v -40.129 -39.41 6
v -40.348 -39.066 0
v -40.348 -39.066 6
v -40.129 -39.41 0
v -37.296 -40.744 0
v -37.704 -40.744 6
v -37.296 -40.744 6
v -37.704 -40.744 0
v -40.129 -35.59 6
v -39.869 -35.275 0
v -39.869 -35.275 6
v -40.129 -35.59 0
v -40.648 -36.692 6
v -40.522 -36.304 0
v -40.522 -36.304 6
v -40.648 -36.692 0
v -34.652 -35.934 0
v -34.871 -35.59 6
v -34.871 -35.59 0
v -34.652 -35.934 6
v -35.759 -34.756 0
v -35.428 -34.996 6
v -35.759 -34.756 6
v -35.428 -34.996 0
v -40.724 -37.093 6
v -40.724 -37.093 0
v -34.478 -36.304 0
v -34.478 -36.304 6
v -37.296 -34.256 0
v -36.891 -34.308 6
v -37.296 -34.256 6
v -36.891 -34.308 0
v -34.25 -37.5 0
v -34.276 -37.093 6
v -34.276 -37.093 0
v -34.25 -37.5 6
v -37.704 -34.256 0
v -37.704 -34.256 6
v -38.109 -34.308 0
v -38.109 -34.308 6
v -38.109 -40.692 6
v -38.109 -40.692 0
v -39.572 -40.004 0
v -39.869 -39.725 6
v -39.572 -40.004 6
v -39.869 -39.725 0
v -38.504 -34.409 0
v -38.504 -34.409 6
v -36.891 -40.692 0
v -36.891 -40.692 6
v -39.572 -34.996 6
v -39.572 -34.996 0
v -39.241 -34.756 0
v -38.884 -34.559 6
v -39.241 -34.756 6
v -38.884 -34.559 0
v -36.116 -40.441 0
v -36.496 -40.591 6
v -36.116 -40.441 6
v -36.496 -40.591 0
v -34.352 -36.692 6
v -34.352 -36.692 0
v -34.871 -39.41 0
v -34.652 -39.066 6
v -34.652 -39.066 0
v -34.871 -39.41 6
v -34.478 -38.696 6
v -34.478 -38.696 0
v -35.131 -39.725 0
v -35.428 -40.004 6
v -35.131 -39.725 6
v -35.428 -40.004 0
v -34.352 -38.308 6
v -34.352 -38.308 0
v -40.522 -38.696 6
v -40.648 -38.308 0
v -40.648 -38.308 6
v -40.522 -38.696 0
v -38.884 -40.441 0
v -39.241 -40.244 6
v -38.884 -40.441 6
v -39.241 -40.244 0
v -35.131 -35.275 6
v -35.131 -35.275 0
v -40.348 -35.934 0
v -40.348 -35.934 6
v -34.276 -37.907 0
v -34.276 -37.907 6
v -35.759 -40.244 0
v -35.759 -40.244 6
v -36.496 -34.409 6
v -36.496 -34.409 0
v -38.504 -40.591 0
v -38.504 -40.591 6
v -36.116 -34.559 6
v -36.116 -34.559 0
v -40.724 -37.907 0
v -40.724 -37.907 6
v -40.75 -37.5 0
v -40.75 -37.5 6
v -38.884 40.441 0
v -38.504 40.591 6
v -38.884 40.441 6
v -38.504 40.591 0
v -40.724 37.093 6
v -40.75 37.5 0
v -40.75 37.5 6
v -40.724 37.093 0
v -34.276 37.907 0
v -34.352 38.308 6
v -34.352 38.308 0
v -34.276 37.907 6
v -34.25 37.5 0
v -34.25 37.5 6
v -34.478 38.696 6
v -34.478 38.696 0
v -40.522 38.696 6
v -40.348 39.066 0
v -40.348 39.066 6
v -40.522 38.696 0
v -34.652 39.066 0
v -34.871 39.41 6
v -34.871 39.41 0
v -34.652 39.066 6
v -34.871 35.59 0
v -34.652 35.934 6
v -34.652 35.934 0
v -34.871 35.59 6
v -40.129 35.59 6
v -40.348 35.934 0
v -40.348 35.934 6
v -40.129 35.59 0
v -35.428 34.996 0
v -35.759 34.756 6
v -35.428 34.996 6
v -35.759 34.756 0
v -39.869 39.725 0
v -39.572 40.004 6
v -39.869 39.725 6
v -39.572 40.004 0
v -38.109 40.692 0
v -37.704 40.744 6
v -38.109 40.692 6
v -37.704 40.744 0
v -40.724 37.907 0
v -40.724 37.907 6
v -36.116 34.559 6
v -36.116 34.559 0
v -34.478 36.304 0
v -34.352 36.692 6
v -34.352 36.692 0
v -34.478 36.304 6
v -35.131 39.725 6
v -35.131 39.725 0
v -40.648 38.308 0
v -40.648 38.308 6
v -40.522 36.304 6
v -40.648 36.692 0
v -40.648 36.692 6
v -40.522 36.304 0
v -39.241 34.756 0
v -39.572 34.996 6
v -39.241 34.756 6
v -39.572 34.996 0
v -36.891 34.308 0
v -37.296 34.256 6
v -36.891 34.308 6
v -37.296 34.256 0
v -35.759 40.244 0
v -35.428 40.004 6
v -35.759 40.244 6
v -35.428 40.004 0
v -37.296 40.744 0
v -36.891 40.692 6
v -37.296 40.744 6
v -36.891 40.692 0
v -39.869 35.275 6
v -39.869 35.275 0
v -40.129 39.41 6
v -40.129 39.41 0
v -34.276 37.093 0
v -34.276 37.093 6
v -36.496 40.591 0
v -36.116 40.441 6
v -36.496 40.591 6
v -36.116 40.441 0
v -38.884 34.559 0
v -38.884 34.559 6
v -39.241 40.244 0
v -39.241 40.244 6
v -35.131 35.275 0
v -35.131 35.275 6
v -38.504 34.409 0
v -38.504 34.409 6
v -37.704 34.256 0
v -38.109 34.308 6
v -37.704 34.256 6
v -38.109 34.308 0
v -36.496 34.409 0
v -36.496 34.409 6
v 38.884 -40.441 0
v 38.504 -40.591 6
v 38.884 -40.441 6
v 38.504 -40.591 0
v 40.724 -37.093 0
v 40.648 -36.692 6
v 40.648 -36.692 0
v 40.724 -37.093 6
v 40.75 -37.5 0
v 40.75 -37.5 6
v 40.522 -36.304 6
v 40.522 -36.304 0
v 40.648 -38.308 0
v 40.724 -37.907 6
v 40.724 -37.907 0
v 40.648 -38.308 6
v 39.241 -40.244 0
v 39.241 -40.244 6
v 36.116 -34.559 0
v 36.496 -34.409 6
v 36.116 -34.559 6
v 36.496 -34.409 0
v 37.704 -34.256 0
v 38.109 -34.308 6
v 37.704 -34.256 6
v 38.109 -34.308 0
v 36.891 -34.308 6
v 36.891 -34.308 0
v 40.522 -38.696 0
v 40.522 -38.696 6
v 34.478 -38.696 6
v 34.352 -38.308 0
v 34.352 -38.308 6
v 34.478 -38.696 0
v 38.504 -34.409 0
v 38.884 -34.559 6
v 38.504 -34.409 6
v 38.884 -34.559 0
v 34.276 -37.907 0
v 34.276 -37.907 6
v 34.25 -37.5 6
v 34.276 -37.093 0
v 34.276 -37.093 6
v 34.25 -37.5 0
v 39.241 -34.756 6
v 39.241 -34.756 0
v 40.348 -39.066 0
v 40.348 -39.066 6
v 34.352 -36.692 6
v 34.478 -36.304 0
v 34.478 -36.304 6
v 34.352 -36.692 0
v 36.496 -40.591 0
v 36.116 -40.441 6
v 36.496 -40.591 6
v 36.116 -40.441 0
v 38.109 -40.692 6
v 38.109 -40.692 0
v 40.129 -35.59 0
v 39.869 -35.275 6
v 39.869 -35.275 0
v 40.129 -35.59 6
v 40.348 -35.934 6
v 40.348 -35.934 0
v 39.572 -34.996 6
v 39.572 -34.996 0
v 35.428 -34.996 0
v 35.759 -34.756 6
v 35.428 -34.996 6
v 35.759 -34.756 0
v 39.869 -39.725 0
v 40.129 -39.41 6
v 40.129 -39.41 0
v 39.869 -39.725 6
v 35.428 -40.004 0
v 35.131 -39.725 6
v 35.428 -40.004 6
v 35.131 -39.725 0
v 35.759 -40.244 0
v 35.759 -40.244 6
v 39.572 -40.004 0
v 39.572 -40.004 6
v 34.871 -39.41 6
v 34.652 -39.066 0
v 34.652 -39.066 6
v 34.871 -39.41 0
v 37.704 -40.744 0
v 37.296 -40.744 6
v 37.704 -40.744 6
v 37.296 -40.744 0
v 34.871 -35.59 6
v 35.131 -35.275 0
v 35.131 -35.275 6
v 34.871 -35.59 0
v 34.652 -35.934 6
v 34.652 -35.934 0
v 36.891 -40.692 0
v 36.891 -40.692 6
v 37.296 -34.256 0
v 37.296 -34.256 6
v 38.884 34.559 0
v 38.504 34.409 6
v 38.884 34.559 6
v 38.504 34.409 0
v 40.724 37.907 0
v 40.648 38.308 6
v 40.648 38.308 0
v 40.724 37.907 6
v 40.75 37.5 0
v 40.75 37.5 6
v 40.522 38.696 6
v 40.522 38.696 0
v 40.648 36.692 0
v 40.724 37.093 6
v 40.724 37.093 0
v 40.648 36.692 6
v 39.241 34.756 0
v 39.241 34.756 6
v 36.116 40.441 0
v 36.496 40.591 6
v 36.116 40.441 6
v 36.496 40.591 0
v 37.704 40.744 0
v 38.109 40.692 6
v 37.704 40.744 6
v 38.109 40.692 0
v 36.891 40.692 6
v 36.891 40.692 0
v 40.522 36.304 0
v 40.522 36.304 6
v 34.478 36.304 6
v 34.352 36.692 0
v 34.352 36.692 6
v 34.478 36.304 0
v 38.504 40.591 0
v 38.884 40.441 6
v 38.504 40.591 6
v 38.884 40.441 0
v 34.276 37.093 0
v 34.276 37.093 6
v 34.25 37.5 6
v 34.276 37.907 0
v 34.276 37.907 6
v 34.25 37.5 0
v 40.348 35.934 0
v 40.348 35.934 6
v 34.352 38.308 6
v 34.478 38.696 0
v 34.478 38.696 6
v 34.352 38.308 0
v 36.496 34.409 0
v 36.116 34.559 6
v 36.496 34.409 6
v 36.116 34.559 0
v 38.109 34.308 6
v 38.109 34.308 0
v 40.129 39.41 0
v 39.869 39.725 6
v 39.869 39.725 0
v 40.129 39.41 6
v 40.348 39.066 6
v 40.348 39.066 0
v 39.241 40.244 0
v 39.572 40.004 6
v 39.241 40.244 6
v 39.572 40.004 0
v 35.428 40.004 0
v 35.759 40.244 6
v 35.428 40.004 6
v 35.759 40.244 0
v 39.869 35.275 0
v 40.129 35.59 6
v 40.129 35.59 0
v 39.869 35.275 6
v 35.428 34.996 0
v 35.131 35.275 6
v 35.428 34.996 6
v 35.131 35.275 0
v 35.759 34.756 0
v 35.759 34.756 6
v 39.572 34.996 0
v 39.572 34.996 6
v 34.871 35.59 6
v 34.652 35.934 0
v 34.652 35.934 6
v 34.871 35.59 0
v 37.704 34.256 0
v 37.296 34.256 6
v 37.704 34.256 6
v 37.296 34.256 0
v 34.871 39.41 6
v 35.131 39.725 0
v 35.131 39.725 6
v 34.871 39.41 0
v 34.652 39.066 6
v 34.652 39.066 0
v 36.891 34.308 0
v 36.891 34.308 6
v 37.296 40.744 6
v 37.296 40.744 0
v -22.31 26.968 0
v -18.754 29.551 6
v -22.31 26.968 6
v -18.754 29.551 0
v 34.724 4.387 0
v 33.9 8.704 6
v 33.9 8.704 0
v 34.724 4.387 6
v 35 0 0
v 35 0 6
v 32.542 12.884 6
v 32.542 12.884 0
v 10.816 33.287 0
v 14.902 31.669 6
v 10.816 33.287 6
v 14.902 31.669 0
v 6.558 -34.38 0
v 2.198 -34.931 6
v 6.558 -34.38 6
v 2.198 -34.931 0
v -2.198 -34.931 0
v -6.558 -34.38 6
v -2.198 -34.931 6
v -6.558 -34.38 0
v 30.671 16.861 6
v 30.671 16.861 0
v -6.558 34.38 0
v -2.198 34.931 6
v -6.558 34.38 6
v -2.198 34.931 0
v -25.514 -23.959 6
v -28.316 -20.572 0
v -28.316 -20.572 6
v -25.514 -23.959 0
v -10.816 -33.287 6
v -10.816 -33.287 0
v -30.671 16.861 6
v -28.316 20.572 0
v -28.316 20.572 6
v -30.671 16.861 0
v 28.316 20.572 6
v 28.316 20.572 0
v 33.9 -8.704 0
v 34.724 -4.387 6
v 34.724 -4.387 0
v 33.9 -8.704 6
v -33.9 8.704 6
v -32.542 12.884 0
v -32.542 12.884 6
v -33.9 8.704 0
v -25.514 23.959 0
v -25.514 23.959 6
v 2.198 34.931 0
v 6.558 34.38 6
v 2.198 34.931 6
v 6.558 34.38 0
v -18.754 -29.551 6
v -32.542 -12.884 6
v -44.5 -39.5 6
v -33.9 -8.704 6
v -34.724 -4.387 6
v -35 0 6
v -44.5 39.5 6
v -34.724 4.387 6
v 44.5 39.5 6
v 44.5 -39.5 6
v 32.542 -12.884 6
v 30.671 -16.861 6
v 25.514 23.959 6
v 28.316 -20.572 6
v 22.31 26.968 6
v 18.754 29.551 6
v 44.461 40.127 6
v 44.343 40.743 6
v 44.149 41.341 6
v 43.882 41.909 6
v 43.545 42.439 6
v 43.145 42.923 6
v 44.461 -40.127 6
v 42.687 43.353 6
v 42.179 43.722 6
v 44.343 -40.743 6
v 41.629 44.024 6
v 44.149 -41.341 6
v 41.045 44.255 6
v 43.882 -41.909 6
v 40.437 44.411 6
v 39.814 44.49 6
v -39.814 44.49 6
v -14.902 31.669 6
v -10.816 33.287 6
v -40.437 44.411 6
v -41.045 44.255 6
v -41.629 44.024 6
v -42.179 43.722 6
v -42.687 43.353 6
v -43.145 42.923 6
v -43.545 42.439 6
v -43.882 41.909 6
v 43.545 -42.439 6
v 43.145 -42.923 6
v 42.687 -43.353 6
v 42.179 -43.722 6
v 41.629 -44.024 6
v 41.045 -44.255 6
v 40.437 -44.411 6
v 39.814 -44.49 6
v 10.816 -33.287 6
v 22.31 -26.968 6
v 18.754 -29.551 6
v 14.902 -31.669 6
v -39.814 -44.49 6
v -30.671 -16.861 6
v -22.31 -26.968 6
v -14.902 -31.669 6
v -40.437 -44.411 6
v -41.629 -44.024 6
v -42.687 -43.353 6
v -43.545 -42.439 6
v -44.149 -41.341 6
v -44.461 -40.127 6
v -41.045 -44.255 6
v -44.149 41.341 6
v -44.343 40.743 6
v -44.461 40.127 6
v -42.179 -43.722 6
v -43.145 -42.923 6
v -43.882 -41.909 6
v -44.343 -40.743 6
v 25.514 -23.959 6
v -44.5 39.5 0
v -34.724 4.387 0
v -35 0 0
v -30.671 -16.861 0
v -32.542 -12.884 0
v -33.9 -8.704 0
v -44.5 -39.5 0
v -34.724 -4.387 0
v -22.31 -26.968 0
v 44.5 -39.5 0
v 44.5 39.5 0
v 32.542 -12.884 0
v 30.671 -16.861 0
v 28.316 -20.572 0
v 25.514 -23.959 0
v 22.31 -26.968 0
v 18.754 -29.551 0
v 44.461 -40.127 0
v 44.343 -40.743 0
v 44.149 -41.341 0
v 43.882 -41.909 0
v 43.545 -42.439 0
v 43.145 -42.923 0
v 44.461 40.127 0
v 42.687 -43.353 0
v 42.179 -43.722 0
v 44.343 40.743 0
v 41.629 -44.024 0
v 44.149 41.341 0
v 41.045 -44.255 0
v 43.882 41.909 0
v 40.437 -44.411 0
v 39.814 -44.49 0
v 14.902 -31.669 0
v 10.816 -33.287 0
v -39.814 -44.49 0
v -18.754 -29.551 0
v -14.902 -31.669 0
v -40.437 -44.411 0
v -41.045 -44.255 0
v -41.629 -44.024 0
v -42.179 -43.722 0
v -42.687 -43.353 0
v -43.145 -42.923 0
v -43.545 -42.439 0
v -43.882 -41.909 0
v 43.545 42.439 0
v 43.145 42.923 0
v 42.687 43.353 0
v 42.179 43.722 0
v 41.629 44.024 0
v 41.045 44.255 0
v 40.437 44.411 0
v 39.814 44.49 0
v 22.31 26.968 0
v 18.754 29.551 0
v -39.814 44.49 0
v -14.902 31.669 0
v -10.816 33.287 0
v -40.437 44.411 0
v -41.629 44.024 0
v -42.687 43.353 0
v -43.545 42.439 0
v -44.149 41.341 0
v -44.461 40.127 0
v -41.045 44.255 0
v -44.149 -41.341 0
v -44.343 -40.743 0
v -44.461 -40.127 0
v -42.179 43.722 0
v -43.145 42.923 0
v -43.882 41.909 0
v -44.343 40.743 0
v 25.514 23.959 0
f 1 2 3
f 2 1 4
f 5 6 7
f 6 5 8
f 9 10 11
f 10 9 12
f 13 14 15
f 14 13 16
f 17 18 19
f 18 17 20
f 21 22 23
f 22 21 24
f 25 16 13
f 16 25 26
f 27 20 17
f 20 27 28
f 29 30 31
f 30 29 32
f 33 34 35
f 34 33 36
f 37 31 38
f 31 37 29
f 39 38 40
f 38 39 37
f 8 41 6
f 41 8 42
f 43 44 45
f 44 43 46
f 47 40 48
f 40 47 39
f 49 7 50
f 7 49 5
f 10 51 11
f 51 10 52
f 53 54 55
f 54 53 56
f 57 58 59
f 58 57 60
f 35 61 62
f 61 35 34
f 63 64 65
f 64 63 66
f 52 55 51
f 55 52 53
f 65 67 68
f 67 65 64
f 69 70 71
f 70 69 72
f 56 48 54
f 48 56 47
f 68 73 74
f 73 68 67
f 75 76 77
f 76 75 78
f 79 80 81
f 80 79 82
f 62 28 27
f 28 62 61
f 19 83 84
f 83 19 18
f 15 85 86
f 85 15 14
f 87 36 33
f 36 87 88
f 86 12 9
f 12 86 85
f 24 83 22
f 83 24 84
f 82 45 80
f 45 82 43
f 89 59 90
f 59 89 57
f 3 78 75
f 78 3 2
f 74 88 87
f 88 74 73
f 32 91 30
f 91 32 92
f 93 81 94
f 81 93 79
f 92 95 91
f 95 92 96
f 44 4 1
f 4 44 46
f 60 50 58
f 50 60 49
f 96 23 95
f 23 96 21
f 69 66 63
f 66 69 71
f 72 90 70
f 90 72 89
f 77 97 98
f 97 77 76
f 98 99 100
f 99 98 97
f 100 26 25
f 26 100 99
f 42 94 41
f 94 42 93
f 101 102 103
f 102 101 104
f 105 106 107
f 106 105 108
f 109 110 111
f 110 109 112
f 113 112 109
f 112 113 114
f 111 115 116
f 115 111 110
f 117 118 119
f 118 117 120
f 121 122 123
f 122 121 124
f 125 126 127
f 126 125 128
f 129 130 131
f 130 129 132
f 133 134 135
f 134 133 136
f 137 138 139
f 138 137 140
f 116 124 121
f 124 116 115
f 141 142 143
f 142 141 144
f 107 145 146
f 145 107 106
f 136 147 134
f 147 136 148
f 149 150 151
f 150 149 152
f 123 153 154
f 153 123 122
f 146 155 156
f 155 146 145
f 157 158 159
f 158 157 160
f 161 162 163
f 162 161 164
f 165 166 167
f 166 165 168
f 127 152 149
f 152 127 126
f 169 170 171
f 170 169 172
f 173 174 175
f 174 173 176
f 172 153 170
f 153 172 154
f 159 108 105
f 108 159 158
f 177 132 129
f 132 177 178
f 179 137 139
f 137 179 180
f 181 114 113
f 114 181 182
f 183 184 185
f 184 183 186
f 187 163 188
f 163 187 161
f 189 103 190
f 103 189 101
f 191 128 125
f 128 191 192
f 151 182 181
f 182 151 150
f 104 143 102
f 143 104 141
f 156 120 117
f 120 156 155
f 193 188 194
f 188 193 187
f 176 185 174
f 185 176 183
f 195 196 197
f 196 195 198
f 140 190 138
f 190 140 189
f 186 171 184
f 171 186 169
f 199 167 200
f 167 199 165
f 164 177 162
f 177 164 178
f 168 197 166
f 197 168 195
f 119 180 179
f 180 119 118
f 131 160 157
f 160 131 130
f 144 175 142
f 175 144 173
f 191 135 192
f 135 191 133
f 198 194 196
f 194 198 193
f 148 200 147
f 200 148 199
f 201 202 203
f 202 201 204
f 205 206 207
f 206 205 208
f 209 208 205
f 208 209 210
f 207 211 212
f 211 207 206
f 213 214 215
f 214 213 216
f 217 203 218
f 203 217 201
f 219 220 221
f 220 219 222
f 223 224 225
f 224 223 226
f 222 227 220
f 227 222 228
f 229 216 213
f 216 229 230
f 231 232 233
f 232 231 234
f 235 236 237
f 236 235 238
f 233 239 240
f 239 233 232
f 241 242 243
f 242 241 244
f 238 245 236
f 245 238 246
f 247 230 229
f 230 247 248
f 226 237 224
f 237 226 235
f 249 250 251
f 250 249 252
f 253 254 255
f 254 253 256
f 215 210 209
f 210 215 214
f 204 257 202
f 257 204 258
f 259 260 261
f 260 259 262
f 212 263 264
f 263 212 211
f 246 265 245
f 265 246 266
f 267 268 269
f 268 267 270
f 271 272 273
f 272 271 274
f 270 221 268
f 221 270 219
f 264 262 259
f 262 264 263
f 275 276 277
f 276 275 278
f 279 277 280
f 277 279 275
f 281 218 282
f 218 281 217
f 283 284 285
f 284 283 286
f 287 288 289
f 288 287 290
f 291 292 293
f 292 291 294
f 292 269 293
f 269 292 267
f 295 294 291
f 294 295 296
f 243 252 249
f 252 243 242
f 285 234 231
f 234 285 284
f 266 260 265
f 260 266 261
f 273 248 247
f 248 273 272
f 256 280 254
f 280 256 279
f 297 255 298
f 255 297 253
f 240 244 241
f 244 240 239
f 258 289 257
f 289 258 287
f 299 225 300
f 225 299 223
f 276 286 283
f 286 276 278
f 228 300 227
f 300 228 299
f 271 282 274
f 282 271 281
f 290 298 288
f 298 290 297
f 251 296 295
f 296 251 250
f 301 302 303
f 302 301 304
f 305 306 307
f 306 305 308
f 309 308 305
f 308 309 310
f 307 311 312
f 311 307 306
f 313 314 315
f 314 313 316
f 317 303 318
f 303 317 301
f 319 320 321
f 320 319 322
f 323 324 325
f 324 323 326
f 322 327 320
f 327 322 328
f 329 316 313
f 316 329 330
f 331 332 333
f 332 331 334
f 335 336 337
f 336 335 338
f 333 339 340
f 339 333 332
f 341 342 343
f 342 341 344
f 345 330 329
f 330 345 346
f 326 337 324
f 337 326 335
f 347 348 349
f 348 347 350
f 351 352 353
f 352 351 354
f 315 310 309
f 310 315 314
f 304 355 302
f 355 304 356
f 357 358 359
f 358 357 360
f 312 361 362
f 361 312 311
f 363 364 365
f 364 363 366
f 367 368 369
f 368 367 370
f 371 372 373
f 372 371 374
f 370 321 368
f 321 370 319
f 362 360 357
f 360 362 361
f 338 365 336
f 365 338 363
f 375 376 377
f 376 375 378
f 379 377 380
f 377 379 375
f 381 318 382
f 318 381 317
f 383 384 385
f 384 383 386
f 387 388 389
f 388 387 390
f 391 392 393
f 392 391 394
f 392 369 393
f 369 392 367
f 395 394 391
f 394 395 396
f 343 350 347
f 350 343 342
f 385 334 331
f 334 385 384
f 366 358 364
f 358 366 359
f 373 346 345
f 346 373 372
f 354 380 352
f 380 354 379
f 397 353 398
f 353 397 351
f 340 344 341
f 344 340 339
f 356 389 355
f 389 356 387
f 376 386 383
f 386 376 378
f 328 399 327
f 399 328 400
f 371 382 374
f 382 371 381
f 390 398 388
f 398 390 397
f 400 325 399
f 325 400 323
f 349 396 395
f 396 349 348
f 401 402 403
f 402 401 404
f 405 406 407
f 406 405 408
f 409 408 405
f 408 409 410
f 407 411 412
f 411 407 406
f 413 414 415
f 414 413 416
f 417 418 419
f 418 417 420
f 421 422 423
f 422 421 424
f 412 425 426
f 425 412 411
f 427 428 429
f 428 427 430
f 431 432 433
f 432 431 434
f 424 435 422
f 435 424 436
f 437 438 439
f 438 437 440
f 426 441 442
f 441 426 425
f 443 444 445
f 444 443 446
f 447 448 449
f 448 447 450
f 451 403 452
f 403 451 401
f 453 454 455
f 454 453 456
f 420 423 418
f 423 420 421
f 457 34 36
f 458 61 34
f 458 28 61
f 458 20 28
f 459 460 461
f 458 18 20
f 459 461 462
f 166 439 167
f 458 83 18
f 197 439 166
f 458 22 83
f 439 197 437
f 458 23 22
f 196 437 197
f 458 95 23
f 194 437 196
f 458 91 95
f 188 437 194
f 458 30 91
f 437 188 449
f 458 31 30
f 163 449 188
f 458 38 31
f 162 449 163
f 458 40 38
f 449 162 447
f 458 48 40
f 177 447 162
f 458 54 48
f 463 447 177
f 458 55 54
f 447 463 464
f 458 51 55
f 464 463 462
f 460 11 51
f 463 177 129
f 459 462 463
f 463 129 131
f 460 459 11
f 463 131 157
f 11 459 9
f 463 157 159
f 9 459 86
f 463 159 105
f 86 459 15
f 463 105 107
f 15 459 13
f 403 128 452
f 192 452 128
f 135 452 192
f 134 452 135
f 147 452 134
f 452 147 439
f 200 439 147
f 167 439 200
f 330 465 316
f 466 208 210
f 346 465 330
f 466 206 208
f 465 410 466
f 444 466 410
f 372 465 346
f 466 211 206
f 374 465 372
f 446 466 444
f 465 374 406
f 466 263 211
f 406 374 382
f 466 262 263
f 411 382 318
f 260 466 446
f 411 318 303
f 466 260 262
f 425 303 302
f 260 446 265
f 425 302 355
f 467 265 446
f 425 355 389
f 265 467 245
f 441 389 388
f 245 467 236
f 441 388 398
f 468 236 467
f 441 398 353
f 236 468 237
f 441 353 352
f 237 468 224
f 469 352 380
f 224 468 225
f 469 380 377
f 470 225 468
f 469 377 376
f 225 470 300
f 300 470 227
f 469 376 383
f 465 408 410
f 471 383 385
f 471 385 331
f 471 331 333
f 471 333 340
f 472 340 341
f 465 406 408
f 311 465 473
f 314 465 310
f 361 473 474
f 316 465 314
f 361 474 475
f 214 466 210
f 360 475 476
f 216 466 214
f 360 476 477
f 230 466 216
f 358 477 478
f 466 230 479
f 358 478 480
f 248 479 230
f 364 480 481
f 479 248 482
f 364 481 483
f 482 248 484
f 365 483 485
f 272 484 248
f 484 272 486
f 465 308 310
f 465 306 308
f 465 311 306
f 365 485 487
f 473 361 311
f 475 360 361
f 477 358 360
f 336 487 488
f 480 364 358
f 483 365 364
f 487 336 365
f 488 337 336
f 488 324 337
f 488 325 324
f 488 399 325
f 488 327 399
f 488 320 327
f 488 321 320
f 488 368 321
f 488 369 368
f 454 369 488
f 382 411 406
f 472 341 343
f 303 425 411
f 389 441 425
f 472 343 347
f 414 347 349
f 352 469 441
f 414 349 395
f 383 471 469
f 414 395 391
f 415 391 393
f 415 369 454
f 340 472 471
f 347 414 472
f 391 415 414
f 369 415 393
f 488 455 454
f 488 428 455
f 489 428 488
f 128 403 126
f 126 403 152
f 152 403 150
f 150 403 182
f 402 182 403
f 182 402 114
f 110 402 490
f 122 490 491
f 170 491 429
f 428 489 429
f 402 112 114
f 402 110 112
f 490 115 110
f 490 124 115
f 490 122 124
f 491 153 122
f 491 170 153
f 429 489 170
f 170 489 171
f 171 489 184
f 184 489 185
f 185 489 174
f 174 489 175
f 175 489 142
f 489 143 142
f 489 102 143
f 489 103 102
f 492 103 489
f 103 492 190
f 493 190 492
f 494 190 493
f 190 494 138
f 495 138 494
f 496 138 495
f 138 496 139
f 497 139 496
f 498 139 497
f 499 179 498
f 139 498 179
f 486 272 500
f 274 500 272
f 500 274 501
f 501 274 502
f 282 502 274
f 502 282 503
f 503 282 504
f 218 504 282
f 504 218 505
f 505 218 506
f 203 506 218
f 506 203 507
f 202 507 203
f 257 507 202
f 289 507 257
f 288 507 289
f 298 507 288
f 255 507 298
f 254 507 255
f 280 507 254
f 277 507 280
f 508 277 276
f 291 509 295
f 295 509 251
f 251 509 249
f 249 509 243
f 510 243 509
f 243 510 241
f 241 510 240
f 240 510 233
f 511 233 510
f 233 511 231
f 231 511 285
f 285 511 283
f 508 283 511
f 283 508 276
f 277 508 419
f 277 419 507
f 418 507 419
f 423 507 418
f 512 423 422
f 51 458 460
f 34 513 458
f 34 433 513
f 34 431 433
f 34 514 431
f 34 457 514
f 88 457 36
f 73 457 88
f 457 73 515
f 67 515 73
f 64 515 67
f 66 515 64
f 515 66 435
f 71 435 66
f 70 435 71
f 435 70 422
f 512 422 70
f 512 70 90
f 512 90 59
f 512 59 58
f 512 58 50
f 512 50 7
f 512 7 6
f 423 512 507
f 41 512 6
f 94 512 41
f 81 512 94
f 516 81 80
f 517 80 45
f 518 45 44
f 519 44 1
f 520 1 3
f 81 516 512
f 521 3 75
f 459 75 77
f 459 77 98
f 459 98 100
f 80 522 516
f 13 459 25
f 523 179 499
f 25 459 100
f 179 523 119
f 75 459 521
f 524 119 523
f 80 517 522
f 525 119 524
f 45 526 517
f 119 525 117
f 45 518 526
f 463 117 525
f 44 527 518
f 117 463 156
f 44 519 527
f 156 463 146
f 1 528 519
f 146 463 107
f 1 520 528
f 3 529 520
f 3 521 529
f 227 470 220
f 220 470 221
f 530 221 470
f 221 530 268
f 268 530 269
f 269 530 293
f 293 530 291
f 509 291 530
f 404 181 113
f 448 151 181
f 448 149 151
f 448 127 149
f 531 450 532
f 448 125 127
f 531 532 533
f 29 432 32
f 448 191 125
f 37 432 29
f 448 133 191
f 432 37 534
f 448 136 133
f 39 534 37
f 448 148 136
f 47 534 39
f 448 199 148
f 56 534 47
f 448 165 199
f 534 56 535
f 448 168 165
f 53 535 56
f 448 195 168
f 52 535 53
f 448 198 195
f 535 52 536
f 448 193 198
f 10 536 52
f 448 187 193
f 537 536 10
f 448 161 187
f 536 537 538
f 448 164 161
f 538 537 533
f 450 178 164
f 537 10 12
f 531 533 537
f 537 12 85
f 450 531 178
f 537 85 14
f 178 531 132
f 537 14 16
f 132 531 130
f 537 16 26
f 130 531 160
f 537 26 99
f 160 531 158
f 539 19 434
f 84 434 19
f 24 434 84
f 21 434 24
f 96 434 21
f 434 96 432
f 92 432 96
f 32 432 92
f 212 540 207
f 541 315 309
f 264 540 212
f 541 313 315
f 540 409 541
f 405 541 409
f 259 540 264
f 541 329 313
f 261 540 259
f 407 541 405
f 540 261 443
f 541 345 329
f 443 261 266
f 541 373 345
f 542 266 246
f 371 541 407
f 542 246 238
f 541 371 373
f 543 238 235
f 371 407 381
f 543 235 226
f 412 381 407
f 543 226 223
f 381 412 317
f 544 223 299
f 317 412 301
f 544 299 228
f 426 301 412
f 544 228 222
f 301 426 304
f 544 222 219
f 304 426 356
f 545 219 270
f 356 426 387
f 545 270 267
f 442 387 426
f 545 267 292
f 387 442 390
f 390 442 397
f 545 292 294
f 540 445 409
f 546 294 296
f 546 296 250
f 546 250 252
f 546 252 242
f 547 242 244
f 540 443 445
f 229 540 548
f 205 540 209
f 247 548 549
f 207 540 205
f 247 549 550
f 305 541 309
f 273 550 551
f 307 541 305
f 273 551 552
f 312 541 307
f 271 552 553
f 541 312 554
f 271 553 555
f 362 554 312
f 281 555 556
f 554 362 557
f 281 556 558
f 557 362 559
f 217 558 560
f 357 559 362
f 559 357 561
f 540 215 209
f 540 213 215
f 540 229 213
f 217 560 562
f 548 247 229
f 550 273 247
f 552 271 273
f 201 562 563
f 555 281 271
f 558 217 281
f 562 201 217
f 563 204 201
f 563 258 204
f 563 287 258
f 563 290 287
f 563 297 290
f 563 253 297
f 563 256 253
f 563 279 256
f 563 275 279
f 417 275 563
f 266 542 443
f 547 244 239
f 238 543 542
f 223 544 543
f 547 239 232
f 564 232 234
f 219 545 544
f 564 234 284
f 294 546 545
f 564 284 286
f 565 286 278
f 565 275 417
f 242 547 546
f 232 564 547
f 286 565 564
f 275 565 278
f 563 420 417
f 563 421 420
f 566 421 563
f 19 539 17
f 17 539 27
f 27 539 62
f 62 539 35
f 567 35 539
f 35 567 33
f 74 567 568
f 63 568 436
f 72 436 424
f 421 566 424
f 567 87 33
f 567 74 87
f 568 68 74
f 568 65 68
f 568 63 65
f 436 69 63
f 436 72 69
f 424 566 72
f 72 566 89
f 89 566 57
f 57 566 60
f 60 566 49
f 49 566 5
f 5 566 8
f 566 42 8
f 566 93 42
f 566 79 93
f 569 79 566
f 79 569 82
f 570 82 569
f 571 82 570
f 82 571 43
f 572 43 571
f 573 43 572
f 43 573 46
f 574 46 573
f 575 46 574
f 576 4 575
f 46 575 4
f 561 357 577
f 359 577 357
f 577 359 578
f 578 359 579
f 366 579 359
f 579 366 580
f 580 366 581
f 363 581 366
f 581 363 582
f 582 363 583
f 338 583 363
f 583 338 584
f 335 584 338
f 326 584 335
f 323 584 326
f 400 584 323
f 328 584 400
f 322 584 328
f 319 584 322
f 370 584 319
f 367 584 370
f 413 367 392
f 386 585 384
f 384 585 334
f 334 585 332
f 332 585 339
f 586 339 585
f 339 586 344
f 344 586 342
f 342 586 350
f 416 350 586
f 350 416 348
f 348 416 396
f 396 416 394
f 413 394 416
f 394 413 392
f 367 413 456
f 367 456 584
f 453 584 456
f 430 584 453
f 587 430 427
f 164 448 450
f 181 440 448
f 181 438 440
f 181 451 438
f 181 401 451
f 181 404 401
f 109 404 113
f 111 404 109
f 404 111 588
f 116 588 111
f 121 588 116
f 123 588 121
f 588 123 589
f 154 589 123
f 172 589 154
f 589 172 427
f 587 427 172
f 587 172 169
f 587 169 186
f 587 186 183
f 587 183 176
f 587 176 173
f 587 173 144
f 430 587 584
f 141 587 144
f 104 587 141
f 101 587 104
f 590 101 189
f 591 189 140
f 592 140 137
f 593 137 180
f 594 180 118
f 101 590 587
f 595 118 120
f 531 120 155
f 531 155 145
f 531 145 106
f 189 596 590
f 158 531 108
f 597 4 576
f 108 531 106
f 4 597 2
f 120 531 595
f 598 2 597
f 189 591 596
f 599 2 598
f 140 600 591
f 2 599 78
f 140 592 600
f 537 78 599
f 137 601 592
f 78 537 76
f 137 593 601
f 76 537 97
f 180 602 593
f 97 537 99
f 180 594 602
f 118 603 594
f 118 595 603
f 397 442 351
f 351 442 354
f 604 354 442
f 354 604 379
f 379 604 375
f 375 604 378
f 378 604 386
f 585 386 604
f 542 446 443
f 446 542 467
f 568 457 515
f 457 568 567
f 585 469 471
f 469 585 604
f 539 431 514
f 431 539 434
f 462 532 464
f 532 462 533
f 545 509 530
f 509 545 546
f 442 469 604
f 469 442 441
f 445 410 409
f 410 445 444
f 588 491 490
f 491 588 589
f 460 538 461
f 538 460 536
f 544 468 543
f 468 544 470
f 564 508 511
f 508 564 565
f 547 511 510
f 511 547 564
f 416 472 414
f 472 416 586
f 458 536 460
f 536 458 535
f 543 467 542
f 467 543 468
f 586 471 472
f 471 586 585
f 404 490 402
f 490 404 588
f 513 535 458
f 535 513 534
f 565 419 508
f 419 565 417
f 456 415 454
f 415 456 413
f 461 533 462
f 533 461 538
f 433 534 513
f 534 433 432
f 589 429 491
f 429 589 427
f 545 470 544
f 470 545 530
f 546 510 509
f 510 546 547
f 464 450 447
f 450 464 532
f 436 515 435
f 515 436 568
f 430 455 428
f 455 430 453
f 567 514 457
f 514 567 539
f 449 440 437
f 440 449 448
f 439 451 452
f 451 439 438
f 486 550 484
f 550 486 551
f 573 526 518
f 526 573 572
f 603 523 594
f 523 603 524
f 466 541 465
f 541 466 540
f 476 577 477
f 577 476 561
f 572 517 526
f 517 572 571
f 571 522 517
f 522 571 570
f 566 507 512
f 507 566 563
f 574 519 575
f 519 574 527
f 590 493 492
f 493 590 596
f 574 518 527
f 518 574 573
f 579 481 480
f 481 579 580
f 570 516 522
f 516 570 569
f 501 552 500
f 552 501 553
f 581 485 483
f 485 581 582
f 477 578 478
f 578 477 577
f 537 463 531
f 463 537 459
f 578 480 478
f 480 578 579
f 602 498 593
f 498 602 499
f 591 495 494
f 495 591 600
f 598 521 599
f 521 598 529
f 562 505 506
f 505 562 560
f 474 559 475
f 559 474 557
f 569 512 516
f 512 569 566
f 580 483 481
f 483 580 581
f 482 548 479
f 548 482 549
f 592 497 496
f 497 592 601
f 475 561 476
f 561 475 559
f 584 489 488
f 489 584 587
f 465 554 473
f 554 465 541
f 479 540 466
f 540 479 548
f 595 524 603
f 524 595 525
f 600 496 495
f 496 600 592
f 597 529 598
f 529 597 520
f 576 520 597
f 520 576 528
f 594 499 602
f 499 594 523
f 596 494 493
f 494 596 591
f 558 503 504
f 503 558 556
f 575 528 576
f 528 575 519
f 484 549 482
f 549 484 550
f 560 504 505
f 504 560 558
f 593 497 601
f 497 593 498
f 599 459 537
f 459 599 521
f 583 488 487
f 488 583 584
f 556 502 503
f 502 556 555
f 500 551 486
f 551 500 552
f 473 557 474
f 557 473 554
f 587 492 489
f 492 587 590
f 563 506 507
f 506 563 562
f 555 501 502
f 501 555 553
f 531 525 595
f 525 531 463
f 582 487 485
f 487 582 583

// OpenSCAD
$fn = 50;


difference() {
	union() {
		hull() {
			translate(v = [-39.5000000000, 39.5000000000, 0]) {
				cylinder(h = 6, r = 5);
			}
			translate(v = [39.5000000000, 39.5000000000, 0]) {
				cylinder(h = 6, r = 5);
			}
			translate(v = [-39.5000000000, -39.5000000000, 0]) {
				cylinder(h = 6, r = 5);
			}
			translate(v = [39.5000000000, -39.5000000000, 0]) {
				cylinder(h = 6, r = 5);
			}
		}
	}
	union() {
		#translate(v = [-37.5000000000, -37.5000000000, -100.0000000000]) {
			cylinder(h = 200, r = 3.2500000000);
		}
		#translate(v = [-37.5000000000, 37.5000000000, -100.0000000000]) {
			cylinder(h = 200, r = 3.2500000000);
		}
		#translate(v = [37.5000000000, -37.5000000000, -100.0000000000]) {
			cylinder(h = 200, r = 3.2500000000);
		}
		#translate(v = [37.5000000000, 37.5000000000, -100.0000000000]) {
			cylinder(h = 200, r = 3.2500000000);
		}
		#cylinder(h = 6, r = 35.0000000000);
	}
}
